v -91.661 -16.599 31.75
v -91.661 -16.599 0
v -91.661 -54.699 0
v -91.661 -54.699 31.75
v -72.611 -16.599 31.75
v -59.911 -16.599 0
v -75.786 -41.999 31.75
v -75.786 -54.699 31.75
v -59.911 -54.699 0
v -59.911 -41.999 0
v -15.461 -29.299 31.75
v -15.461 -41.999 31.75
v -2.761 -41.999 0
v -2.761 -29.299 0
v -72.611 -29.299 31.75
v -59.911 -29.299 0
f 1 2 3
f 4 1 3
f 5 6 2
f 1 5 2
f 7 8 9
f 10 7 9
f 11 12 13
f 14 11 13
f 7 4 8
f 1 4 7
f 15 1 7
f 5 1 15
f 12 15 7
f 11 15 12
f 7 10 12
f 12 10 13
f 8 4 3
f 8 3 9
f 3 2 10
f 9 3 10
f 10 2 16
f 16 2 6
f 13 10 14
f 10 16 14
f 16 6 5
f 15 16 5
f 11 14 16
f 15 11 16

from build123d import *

# Parameters (mm, degrees)
F1_DEPTH = 31.75
F3_DEPTH = 25.4
F5_DEPTH = 12.7
F7_DEPTH = 12.7
F9_DEPTH = 12.7


# Not quite as in the source:
# - a length typed as a fraction of an inch, garbled in the dataset ("3 / 203.2 mm" for 3/8 in), is restored


with BuildPart() as f1:
    # F0 (on Top) → F1 (new body)
    with BuildSketch(Plane.XY):
        Polygon((-59.9109128669, -16.5989177401), (-91.6609128669, -16.5989177401), (-91.6609128669, -54.6989177401), (-59.9109128669, -54.6989177401), (-59.9109128669, -41.9989177401), (-2.7609128669, -41.9989177401), (-2.7609128669, -29.2989177401), (-59.9109128669, -29.2989177401), align=None)
    extrude(amount=F1_DEPTH)

    # F2 (on face) → F3 (cut)
    with BuildSketch(Plane.XZ.offset(54.6989177401)):
        Polygon((-74.4201987982, 31.75), (-59.9109128669, 0), (-59.9109128669, 31.75), align=None)
    extrude(amount=F3_DEPTH, mode=Mode.SUBTRACT)

    # F4 (on face) → F5 (cut)
    with BuildSketch(Plane.XZ.offset(54.6989177401)):
        Polygon((-75.7859128669, 31.75), (-59.9109128669, 0), (-46.3341996074, 12.059702538), (-46.3341996074, 45.9536202252), (-62.0433166623, 45.9536202252), align=None)
    extrude(amount=-F5_DEPTH, mode=Mode.SUBTRACT)

    # F6 (on face) → F7 (cut)
    with BuildSketch(Plane(origin=(0, -16.5989177401, 0), x_dir=(-1, 0, 0), z_dir=(0, 1, 0))):
        Polygon((59.9109128669, 0), (72.6109128669, 31.75), (59.9109128669, 31.75), align=None)
    extrude(amount=-F7_DEPTH, mode=Mode.SUBTRACT)

    # F8 (on face) → F9 (cut)
    with BuildSketch(Plane.XZ.offset(41.9989177401)):
        Polygon((-15.4609128669, 31.75), (-2.7609128669, 0), (-2.7609128669, 31.75), align=None)
    extrude(amount=-F9_DEPTH, mode=Mode.SUBTRACT)


solid = f1.part
